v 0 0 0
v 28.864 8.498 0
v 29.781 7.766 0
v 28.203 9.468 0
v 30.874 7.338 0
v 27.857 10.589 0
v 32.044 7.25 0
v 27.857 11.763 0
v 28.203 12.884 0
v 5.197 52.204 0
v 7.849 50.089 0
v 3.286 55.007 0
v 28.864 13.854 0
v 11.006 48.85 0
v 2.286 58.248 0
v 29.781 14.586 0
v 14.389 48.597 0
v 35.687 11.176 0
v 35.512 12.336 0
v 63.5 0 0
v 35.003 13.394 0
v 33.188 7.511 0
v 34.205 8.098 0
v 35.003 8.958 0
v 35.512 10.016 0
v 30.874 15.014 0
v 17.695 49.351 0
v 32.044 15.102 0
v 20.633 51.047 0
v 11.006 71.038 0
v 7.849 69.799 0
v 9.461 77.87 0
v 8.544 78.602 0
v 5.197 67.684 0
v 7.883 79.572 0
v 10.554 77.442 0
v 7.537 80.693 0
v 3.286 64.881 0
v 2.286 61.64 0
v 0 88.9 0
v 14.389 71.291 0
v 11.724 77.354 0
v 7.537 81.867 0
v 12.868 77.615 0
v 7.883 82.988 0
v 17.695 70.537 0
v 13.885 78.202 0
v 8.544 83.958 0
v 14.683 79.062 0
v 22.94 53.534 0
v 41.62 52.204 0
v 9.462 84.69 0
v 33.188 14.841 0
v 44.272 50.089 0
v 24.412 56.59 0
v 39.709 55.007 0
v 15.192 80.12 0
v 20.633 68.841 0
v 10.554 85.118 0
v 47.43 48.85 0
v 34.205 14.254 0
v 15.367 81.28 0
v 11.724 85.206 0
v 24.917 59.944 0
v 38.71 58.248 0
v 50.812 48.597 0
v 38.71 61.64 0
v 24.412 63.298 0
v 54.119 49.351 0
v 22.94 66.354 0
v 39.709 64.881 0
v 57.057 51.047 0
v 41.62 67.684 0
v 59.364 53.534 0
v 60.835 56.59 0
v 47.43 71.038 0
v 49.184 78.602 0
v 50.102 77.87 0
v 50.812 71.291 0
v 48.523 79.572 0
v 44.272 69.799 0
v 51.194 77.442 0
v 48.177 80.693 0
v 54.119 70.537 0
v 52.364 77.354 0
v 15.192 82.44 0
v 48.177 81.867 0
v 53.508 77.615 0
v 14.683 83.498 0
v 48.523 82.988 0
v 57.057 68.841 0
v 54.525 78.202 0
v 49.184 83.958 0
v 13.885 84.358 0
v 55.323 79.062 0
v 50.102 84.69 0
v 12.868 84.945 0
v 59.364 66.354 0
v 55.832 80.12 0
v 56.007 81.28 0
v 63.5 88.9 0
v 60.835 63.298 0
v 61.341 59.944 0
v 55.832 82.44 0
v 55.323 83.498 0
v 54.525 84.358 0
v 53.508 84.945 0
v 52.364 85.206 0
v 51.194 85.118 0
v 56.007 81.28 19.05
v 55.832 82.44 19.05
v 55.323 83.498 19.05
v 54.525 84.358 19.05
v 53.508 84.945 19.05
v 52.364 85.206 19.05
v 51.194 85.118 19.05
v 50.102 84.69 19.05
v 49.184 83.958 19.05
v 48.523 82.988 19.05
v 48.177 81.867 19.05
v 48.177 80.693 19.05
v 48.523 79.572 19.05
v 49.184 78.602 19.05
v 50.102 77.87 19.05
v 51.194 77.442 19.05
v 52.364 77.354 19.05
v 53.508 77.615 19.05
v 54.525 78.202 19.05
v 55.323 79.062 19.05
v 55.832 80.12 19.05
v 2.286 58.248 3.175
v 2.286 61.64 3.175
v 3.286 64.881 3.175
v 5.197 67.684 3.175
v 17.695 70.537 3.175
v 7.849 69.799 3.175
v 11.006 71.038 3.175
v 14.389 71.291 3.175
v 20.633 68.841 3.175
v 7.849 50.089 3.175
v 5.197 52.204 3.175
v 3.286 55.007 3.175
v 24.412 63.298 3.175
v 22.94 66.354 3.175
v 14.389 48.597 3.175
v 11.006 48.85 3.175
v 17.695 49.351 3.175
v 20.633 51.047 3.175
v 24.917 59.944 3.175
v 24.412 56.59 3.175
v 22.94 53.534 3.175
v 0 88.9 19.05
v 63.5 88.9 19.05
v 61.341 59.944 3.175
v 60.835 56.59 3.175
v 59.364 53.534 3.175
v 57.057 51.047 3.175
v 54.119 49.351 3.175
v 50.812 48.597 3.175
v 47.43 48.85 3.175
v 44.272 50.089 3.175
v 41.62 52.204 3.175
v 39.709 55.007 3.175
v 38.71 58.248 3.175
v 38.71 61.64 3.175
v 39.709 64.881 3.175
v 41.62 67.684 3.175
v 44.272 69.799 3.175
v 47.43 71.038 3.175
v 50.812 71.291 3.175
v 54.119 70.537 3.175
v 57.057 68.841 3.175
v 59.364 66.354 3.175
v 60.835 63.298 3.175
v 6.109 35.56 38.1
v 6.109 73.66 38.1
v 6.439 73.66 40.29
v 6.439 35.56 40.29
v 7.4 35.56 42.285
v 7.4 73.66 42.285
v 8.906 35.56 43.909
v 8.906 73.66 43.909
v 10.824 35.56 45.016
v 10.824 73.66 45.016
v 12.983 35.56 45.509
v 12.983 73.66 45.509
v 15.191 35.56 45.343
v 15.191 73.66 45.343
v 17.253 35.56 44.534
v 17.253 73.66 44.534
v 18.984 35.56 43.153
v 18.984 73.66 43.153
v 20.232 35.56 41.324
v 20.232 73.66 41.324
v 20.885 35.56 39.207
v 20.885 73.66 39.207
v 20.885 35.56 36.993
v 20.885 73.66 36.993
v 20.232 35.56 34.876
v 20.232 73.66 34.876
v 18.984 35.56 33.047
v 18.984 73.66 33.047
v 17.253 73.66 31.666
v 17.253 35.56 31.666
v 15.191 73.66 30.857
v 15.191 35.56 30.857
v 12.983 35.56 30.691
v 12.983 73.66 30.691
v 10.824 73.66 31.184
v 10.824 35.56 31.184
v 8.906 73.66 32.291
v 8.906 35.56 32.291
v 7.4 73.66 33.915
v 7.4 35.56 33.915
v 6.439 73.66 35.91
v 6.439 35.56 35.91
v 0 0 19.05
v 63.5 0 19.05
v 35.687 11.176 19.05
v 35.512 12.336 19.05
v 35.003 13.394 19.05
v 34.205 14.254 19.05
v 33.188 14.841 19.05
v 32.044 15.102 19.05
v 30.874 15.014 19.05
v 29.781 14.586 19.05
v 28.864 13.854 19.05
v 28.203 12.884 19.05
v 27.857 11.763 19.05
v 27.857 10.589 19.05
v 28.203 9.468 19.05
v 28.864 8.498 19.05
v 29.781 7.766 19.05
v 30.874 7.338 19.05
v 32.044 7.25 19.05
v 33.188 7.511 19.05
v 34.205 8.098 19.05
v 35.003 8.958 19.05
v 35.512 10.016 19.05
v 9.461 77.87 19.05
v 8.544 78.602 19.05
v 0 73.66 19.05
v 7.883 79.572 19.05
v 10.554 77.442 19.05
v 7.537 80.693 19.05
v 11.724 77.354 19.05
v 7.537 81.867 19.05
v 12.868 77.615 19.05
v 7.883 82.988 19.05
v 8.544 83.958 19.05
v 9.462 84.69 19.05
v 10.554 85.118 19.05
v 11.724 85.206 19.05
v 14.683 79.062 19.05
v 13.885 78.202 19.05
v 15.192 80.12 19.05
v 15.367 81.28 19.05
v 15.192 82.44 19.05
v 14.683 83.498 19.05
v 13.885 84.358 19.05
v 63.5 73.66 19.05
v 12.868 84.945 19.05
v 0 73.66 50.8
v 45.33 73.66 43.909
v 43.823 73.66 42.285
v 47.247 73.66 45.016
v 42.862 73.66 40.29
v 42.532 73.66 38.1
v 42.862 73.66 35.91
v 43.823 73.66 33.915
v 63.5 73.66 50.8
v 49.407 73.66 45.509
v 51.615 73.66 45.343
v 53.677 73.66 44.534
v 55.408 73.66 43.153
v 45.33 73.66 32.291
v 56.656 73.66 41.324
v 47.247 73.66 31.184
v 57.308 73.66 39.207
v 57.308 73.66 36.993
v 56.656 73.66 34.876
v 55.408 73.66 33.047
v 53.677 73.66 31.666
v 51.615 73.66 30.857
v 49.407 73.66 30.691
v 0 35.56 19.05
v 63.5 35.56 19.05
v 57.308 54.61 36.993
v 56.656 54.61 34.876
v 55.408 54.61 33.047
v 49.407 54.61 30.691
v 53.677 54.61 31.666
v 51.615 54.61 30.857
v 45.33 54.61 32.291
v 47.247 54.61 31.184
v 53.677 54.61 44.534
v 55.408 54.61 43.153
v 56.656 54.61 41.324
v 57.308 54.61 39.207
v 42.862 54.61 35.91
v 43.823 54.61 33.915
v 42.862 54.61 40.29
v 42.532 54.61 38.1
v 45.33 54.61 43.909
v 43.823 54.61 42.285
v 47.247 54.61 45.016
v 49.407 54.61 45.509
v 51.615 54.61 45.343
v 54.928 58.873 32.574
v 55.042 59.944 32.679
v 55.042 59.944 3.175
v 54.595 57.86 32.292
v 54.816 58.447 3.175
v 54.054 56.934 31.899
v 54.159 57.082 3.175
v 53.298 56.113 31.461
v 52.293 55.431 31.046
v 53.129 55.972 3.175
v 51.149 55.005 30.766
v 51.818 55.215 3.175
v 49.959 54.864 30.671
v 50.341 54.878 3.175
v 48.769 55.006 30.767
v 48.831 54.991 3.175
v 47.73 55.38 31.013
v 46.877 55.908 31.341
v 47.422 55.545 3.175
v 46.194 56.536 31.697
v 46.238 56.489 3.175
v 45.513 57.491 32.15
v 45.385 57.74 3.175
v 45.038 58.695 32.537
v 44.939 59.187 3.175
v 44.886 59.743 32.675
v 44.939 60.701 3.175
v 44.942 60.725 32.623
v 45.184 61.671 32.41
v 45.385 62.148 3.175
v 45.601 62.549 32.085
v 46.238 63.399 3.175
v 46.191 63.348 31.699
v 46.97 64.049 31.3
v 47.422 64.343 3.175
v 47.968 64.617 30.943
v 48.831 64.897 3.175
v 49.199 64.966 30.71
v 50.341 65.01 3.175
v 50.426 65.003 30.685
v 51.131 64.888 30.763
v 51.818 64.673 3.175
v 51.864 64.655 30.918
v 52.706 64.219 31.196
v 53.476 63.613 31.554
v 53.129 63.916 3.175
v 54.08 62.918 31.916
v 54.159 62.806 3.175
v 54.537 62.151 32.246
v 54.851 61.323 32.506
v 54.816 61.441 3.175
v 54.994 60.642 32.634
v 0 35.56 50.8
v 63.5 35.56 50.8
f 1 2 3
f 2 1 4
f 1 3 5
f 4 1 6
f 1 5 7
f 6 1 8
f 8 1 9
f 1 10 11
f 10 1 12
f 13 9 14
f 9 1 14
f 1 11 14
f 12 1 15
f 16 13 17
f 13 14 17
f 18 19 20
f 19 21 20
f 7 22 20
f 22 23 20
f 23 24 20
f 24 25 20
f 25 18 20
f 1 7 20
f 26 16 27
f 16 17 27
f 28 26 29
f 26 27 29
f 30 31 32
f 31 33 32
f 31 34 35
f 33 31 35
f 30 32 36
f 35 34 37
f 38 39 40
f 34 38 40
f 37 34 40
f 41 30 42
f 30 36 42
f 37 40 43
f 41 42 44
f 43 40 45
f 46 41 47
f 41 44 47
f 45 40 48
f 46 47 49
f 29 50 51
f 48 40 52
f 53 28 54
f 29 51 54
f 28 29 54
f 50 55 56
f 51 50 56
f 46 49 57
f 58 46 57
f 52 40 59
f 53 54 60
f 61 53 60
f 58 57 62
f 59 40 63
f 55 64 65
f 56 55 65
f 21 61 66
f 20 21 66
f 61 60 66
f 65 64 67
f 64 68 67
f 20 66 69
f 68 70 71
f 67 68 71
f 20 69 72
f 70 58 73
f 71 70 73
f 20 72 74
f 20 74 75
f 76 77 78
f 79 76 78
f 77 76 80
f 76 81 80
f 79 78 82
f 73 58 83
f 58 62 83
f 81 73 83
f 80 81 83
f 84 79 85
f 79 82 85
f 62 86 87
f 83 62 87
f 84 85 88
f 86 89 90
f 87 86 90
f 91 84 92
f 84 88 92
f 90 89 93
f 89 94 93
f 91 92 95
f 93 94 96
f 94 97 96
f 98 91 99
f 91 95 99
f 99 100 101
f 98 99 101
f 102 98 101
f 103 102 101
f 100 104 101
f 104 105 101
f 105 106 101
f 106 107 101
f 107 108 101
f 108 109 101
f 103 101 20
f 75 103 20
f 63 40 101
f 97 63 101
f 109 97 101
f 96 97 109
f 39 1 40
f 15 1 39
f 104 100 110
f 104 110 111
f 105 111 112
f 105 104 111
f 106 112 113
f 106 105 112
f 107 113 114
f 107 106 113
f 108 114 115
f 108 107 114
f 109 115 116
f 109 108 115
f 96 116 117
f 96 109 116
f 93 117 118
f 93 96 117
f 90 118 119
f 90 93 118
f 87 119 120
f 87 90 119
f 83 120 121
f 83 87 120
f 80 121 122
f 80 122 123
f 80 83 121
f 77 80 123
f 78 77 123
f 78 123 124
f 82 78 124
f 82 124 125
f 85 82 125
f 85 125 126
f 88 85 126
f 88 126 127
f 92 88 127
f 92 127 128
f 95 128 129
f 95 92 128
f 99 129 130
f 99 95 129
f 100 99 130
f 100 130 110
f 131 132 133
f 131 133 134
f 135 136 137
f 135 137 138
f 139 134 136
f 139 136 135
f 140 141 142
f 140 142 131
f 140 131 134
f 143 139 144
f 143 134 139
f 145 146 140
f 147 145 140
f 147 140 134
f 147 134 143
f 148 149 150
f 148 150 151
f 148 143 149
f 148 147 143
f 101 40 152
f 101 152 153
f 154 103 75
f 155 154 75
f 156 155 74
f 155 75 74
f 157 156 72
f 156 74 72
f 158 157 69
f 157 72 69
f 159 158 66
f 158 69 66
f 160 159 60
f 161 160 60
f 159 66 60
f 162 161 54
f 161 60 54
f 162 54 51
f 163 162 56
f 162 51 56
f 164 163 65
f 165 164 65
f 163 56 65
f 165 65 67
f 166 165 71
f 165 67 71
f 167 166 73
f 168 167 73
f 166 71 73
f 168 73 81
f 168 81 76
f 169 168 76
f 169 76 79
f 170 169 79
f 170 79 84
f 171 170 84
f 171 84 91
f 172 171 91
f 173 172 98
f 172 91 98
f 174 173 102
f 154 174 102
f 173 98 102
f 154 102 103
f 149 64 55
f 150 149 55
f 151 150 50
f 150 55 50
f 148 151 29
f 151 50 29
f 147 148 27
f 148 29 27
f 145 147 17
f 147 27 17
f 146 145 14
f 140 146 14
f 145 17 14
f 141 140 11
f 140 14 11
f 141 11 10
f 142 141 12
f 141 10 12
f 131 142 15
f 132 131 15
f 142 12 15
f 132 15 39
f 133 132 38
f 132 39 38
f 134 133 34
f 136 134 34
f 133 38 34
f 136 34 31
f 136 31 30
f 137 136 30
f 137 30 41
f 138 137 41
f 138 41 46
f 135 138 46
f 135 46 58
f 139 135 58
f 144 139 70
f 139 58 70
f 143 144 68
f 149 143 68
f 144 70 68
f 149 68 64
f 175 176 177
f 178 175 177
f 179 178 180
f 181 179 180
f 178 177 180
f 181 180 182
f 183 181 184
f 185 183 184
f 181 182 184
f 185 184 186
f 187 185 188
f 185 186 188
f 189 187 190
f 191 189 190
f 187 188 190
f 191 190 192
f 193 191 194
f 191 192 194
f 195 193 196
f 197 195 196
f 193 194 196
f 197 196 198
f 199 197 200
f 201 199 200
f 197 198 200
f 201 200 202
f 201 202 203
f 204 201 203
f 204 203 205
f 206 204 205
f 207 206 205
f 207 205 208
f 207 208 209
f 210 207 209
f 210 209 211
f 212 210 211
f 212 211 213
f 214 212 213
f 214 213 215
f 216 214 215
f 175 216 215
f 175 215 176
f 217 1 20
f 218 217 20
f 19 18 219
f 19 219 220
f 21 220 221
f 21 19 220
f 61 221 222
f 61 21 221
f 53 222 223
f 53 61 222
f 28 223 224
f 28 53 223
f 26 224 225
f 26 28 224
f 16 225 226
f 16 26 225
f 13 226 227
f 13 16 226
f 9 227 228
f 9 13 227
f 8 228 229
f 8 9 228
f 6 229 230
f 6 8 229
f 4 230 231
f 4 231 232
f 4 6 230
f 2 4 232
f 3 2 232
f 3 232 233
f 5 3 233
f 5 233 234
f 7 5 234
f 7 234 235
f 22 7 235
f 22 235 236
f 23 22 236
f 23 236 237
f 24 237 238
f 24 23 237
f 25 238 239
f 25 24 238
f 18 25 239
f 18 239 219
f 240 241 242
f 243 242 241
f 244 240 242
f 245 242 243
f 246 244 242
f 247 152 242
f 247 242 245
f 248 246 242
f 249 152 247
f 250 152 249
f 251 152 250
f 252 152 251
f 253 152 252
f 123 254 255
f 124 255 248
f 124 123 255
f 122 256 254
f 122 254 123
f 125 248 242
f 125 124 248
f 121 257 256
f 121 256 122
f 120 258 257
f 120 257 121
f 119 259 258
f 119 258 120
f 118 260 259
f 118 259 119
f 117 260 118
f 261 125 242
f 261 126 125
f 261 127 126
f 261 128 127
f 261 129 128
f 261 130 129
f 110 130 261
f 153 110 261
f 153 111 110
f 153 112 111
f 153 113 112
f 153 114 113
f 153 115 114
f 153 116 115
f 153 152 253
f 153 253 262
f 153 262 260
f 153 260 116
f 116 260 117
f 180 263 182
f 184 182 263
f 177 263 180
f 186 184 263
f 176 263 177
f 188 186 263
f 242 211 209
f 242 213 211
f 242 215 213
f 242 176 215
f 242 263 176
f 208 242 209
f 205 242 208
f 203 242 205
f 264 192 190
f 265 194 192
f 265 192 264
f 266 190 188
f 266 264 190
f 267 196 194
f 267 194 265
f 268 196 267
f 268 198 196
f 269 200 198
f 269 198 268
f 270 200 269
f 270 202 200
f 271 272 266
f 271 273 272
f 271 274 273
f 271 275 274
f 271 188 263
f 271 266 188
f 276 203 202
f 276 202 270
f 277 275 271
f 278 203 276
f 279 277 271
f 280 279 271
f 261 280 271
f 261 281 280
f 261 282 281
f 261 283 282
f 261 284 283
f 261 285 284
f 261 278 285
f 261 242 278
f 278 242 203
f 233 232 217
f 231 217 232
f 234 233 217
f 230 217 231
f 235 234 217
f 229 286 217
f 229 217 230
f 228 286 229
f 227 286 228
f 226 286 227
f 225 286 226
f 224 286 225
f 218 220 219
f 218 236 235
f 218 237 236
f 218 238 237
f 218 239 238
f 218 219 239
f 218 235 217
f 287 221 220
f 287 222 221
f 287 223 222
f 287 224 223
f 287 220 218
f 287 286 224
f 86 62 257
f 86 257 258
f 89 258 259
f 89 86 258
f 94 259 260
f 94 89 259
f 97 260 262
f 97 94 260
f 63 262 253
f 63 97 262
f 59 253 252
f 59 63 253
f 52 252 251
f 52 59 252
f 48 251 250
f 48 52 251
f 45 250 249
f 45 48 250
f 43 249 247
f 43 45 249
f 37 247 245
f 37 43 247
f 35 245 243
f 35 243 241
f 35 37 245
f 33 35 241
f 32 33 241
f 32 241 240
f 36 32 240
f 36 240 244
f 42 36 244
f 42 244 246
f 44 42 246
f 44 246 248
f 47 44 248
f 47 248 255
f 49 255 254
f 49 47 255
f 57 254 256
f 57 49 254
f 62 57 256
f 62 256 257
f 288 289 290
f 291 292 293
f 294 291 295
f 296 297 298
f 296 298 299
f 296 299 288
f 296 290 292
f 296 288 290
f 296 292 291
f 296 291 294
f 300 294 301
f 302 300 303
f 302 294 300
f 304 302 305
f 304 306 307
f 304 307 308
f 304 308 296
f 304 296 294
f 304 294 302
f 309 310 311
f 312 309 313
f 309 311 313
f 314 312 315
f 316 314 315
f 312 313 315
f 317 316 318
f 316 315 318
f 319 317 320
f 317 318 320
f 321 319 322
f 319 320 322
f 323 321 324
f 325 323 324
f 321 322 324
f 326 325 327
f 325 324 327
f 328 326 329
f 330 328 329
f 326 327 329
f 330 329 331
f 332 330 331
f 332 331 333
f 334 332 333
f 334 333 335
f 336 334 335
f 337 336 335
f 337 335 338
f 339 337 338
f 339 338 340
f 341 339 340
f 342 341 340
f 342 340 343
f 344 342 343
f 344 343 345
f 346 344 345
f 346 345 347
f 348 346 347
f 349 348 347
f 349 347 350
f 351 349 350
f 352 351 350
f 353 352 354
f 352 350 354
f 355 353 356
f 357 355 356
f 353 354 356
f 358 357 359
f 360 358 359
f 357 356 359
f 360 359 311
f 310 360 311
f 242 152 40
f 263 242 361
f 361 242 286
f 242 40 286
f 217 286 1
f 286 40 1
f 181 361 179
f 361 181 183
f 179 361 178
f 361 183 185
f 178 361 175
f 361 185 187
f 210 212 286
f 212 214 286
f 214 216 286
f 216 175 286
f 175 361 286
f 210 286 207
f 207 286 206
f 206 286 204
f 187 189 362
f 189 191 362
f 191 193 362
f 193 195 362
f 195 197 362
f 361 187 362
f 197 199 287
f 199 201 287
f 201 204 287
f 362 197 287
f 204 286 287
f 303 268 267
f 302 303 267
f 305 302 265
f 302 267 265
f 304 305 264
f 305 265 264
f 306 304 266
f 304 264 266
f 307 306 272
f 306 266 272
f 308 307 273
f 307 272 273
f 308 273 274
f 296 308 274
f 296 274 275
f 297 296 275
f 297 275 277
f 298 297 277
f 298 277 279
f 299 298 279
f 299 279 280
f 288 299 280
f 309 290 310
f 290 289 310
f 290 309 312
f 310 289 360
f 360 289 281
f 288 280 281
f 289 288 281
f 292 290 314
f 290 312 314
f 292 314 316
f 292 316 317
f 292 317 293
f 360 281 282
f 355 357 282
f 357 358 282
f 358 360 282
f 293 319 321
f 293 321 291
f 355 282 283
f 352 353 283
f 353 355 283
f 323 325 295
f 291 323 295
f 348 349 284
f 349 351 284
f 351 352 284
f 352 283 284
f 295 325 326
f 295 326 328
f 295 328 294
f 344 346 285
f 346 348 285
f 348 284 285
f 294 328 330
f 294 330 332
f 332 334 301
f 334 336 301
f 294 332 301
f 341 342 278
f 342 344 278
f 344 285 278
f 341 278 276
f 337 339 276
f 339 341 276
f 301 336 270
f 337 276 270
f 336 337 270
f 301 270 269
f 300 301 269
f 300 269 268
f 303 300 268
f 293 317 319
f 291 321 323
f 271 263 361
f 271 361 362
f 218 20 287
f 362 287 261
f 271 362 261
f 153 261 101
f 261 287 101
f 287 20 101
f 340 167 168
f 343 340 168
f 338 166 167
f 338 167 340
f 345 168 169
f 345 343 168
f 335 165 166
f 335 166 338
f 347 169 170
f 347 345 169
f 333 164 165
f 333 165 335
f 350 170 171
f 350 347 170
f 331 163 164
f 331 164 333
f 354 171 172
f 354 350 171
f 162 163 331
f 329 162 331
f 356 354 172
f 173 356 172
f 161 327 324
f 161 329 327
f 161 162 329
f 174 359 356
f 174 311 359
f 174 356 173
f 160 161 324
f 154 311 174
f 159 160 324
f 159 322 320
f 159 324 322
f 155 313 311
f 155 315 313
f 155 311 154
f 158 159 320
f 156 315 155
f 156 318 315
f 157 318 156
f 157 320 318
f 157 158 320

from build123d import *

# Parameters (mm, degrees)
F0_W      = 63.5
F0_H      = 15.24
F0_R      = 3.937
F0_H_2    = 38.1
F0_R_2    = 7.4295
F0_H_3    = 35.56
F1_DEPTH  = 19.05
F5_DEPTH  = 50.8
F7_DEPTH  = 3.175
F2_R      = 11.3792
F9_DEPTH  = 3.175
F6_R      = 7.4295
F10_DEPTH = 19.05
F11_DEPTH = 73.661
F8_R      = 5.08
F12_DEPTH = 31.75


# Not quite as in the source:
# - a feature names something its author has since deleted; it is built from what else it names


with BuildPart() as f1:
    # F0 (on Top) → F1 (new body)
    with BuildSketch(Plane.XY):
        with Locations((31.75, 81.28)):
            Rectangle(F0_W, F0_H)
        with Locations((11.43, 81.28)):
            Circle(F0_R, mode=Mode.SUBTRACT)
        with Locations((52.07, 81.28)):
            Circle(F0_R, mode=Mode.SUBTRACT)
        with Locations((31.75, 54.61)):
            Rectangle(F0_W, F0_H_2)
        with Locations((13.5382, 59.944)):
            Circle(F0_R_2, mode=Mode.SUBTRACT)
        with Locations((49.9618, 59.944)):
            Circle(F0_R_2, mode=Mode.SUBTRACT)
        with Locations((13.5382, 59.944)):
            Circle(F0_R_2)
        with Locations((49.9618, 59.944)):
            Circle(F0_R_2)
        with Locations((31.75, 17.78)):
            Rectangle(F0_W, F0_H_3)
        with Locations((31.75, 11.176)):
            Circle(F0_R, mode=Mode.SUBTRACT)
    extrude(amount=F1_DEPTH)


with BuildPart() as f3_1:
    # F3: copy of F1
    add(f1.part.moved(Location((-152.4, 0, 0))))


with BuildPart() as f1_1:
    add(f1.part)

    # F0 (on Top) → F5 (join)
    with BuildSketch(Plane.XY):
        with Locations((31.75, 54.61)):
            Rectangle(F0_W, F0_H_2)
        with Locations((13.5382, 59.944)):
            Circle(F0_R_2, mode=Mode.SUBTRACT)
        with Locations((49.9618, 59.944)):
            Circle(F0_R_2, mode=Mode.SUBTRACT)
        with Locations((49.9618, 59.944)):
            Circle(F0_R_2)
        with Locations((13.5382, 59.944)):
            Circle(F0_R_2)
    extrude(amount=F5_DEPTH)

    # F0 (on Top) → F7 (cut)
    with BuildSketch(Plane.XY):
        with Locations((49.9618, 59.944)):
            Circle(F0_R_2)
        with Locations((13.5382, 59.944)):
            Circle(F0_R_2)
    extrude(amount=F7_DEPTH, mode=Mode.SUBTRACT)

    # F2 (on face) → F9 (cut)
    with BuildSketch(Plane(origin=(0, 0, 0), x_dir=(1, 0, 0), z_dir=(0, 0, -1))):
        with Locations((49.9618, -59.944)):
            Circle(F2_R)
        with Locations((13.5382, -59.944)):
            Circle(F2_R)
    extrude(amount=-F9_DEPTH, mode=Mode.SUBTRACT)

    # F6 (on face) → F10 (cut)
    with BuildSketch(Plane(origin=(0, 73.66, 0), x_dir=(-1, 0, 0), z_dir=(0, 1, 0))):
        with Locations((-49.9618, 38.1)):
            Circle(F6_R)
    extrude(amount=-F10_DEPTH, mode=Mode.SUBTRACT)

    # F6 (on face) → F11 (cut, through all)
    with BuildSketch(Plane(origin=(0, 73.66, 0), x_dir=(-1, 0, 0), z_dir=(0, 1, 0))):
        with Locations((-13.5382, 38.1)):
            Circle(F6_R)
    extrude(amount=-F11_DEPTH, mode=Mode.SUBTRACT)

    # F8 (on face) → F12 (cut)
    with BuildSketch(Plane(origin=(0, 0, 3.175), x_dir=(1, 0, 0), z_dir=(0, 0, -1))):
        with Locations((49.9618, -59.944)):
            Circle(F8_R)
    extrude(amount=-F12_DEPTH, mode=Mode.SUBTRACT)


solid = f1_1.part
